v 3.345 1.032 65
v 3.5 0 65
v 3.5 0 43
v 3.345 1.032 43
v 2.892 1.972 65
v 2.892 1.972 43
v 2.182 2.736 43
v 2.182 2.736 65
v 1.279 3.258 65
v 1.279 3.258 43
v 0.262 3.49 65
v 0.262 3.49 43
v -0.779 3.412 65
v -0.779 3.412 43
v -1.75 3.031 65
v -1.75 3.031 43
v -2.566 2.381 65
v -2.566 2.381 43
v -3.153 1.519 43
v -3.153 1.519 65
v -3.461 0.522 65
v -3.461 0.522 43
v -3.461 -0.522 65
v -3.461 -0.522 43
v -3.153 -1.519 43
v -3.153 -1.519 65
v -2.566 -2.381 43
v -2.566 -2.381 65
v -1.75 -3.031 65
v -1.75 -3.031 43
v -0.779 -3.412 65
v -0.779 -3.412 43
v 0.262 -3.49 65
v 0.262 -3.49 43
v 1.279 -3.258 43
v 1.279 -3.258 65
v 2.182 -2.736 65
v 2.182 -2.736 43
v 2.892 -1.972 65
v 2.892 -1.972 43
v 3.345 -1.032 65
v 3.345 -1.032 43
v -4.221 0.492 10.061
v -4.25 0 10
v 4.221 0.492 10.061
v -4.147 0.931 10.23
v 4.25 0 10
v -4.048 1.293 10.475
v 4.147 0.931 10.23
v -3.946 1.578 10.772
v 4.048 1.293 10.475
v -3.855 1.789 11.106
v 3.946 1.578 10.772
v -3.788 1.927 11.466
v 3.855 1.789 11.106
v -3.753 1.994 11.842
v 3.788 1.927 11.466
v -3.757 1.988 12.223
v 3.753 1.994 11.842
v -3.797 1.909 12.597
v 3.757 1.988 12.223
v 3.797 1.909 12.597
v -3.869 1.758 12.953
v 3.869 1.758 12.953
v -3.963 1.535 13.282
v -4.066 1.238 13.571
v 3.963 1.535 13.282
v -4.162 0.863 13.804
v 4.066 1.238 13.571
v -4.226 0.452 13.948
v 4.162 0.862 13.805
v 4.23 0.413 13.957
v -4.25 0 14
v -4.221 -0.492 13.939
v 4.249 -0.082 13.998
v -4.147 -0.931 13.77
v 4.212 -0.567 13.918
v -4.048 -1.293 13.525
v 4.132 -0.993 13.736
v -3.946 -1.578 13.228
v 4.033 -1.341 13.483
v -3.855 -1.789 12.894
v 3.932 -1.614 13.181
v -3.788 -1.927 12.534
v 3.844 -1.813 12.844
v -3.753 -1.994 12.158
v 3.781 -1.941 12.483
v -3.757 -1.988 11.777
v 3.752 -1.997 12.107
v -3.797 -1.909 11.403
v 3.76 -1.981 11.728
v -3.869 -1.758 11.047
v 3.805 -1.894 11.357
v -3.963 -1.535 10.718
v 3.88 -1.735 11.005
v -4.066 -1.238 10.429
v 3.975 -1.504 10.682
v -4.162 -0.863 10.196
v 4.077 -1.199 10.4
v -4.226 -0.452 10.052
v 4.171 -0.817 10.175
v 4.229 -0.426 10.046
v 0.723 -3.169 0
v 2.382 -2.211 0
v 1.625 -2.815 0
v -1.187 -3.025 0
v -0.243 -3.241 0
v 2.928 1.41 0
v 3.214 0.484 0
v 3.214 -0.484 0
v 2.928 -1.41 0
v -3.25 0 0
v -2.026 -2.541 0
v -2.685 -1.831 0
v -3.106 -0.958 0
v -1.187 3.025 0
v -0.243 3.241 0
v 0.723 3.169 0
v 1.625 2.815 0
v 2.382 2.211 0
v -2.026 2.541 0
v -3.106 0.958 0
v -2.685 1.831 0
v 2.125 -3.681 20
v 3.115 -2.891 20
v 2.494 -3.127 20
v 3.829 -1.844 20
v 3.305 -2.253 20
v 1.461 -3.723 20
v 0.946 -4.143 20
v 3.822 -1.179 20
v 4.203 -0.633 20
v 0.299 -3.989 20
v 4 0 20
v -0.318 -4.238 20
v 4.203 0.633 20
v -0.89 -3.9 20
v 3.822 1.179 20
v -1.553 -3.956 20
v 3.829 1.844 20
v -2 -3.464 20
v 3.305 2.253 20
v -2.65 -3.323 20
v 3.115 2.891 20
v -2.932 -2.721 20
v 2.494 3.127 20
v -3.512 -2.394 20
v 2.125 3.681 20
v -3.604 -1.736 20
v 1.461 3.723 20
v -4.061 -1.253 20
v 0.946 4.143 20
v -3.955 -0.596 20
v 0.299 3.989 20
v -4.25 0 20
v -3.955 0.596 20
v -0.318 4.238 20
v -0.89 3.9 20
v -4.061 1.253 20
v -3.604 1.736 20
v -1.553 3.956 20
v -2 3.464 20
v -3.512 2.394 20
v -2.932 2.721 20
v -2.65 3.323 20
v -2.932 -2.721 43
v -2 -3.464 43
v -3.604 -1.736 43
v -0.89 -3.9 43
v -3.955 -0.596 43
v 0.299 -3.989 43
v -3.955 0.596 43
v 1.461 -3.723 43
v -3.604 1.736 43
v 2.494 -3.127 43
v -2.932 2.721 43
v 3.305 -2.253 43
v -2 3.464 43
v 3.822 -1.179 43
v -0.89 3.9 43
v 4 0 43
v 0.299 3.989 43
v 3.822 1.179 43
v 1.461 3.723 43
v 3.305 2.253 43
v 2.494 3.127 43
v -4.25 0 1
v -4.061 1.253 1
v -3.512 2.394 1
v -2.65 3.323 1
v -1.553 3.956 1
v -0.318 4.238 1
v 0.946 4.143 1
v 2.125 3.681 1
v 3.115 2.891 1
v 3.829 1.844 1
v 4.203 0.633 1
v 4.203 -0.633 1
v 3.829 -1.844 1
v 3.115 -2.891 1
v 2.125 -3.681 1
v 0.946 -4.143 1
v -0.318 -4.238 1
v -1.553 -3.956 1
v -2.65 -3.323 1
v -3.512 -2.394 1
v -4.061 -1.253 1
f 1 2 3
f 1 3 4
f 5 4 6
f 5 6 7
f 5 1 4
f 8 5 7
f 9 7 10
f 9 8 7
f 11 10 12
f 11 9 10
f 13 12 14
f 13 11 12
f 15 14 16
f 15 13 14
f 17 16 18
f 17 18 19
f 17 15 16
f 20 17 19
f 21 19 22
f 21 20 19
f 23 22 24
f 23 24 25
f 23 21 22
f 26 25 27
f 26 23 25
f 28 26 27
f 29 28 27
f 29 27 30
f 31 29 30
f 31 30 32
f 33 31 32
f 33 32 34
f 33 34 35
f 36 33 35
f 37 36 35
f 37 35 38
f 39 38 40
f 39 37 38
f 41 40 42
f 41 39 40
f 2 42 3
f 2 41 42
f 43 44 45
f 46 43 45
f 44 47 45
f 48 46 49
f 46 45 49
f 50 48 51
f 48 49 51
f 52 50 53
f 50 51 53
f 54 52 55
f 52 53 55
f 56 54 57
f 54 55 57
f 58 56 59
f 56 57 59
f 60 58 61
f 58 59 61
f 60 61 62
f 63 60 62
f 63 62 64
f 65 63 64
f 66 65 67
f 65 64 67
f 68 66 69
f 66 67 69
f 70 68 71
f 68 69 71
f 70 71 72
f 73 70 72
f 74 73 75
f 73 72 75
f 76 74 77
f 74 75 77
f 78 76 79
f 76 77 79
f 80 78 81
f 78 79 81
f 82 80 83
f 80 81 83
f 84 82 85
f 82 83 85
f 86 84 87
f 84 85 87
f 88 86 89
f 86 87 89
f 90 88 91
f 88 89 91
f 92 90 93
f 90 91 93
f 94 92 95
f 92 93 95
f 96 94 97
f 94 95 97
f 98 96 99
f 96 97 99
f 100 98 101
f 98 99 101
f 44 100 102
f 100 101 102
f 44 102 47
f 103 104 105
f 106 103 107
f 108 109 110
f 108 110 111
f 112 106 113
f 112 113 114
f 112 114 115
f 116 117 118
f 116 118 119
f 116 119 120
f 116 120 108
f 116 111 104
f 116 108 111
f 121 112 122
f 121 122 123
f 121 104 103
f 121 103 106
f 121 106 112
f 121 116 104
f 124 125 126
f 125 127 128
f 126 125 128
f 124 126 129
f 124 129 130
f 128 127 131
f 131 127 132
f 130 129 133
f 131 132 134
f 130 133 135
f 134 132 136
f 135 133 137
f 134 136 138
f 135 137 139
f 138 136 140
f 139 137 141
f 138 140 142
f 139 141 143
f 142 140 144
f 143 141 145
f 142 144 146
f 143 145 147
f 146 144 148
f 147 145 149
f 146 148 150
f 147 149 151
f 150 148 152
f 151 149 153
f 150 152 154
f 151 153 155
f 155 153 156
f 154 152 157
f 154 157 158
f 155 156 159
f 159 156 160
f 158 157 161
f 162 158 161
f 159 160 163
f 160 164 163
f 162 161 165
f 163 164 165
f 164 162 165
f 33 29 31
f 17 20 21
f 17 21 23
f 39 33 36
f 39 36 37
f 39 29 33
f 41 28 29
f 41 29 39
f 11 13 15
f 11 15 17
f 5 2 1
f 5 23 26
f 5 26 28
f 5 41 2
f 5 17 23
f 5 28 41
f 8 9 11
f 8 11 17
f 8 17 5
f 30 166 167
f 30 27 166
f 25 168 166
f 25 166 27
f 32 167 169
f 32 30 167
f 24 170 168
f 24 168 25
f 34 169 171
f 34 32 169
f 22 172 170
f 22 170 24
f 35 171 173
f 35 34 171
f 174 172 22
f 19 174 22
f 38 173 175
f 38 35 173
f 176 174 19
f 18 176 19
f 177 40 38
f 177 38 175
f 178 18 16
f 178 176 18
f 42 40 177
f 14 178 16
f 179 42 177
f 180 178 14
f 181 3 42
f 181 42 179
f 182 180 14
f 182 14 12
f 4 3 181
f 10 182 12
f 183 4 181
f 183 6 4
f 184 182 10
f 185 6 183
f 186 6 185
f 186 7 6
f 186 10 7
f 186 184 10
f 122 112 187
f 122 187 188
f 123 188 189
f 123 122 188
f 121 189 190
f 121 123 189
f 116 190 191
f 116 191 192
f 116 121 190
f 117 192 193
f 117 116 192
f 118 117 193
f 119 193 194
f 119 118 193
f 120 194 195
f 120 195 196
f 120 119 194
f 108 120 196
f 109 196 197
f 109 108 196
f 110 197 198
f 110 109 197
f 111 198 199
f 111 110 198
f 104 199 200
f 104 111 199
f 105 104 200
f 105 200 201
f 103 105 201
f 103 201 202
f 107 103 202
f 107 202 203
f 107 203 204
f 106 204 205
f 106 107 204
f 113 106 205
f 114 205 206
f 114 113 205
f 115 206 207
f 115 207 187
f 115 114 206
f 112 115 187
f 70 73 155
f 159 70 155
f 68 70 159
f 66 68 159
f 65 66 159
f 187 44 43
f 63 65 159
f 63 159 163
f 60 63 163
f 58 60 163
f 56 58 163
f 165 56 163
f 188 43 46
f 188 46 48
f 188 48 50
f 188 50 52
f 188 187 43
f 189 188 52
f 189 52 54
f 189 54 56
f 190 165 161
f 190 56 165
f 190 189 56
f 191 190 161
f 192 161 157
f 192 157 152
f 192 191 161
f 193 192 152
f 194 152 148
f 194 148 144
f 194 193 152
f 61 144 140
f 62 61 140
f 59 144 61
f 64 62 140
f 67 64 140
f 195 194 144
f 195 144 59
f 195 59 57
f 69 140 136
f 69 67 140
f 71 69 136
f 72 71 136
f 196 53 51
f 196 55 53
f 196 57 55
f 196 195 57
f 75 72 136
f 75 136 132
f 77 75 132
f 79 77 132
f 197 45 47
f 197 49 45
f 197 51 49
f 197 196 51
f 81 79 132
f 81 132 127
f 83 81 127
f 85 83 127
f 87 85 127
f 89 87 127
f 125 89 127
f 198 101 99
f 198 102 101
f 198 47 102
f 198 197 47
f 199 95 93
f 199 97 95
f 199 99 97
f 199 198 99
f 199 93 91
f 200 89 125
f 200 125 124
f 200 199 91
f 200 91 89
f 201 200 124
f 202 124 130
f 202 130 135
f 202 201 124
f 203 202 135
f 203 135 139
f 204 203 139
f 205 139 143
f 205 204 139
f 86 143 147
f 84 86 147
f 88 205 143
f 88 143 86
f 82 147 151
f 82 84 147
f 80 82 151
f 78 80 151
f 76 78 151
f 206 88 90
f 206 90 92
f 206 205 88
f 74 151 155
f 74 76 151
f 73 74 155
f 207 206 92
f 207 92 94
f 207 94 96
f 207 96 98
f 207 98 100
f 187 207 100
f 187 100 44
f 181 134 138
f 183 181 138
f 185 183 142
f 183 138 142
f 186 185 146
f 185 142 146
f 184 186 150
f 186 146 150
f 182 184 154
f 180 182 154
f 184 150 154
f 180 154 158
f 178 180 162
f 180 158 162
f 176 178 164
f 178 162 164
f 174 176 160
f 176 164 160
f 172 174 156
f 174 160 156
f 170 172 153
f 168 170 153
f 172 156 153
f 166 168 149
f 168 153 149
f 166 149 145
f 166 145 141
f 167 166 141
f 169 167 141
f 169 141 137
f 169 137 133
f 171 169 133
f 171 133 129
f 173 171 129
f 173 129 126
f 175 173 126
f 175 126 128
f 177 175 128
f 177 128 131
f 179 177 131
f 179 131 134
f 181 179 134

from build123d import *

# Parameters (mm, degrees)
SKIZZE1_R                            = 4
AUFSATZ_LINEAR_AUSTRAGEN1_DEPTH      = 65
SKIZZE2_R                            = 4.25
AUFSATZ_LINEAR_AUSTRAGEN2_DEPTH      = 20
SKIZZE3_R                            = 2
SCHNITT_LINEAR_AUSTRAGEN1_DEPTH      = 5.25
SCHNITT_LINEAR_AUSTRAGEN1_DEPTH_BACK = 5.25
FASE1_SIZE                           = 1
SKIZZE4_R                            = 4
SKIZZE4_R_2                          = 3.5
SCHNITT_LINEAR_AUSTRAGEN2_DEPTH      = 22


with BuildPart() as part:
    # Skizze1 → Aufsatz-Linear austragen1 (new body)
    with BuildSketch(Plane.XY):
        Circle(SKIZZE1_R)
    extrude(amount=AUFSATZ_LINEAR_AUSTRAGEN1_DEPTH)

    # Skizze2 → Aufsatz-Linear austragen2 (add)
    with BuildSketch(Plane(origin=(0, 0, 0), x_dir=(-1, 0, 0), z_dir=(0, 0, -1))):
        Circle(SKIZZE2_R)
    extrude(amount=-AUFSATZ_LINEAR_AUSTRAGEN2_DEPTH)

    # Skizze3 → Schnitt-Linear austragen1 (cut, two sides)
    with BuildSketch(Plane(origin=(0, 0, 0), x_dir=(0, 0, -1), z_dir=(1, 0, 0))) as schnitt_linear_austragen1_sk:
        with Locations((-12, 0)):
            Circle(SKIZZE3_R)
    extrude(amount=SCHNITT_LINEAR_AUSTRAGEN1_DEPTH, mode=Mode.SUBTRACT)
    extrude(schnitt_linear_austragen1_sk.sketch, amount=-SCHNITT_LINEAR_AUSTRAGEN1_DEPTH_BACK, mode=Mode.SUBTRACT)

    # Fase1
    fase1_edges = [part.edges().sort_by_distance(p)[0] for p in [
        (4.25, 0, 0),
    ]]
    chamfer(fase1_edges, length=FASE1_SIZE)

    # Skizze4 → Schnitt-Linear austragen2 (cut)
    with BuildSketch(Plane.XY.offset(65)):
        Circle(SKIZZE4_R)
        Circle(SKIZZE4_R_2, mode=Mode.SUBTRACT)
    extrude(amount=-SCHNITT_LINEAR_AUSTRAGEN2_DEPTH, mode=Mode.SUBTRACT)


solid = part.part
